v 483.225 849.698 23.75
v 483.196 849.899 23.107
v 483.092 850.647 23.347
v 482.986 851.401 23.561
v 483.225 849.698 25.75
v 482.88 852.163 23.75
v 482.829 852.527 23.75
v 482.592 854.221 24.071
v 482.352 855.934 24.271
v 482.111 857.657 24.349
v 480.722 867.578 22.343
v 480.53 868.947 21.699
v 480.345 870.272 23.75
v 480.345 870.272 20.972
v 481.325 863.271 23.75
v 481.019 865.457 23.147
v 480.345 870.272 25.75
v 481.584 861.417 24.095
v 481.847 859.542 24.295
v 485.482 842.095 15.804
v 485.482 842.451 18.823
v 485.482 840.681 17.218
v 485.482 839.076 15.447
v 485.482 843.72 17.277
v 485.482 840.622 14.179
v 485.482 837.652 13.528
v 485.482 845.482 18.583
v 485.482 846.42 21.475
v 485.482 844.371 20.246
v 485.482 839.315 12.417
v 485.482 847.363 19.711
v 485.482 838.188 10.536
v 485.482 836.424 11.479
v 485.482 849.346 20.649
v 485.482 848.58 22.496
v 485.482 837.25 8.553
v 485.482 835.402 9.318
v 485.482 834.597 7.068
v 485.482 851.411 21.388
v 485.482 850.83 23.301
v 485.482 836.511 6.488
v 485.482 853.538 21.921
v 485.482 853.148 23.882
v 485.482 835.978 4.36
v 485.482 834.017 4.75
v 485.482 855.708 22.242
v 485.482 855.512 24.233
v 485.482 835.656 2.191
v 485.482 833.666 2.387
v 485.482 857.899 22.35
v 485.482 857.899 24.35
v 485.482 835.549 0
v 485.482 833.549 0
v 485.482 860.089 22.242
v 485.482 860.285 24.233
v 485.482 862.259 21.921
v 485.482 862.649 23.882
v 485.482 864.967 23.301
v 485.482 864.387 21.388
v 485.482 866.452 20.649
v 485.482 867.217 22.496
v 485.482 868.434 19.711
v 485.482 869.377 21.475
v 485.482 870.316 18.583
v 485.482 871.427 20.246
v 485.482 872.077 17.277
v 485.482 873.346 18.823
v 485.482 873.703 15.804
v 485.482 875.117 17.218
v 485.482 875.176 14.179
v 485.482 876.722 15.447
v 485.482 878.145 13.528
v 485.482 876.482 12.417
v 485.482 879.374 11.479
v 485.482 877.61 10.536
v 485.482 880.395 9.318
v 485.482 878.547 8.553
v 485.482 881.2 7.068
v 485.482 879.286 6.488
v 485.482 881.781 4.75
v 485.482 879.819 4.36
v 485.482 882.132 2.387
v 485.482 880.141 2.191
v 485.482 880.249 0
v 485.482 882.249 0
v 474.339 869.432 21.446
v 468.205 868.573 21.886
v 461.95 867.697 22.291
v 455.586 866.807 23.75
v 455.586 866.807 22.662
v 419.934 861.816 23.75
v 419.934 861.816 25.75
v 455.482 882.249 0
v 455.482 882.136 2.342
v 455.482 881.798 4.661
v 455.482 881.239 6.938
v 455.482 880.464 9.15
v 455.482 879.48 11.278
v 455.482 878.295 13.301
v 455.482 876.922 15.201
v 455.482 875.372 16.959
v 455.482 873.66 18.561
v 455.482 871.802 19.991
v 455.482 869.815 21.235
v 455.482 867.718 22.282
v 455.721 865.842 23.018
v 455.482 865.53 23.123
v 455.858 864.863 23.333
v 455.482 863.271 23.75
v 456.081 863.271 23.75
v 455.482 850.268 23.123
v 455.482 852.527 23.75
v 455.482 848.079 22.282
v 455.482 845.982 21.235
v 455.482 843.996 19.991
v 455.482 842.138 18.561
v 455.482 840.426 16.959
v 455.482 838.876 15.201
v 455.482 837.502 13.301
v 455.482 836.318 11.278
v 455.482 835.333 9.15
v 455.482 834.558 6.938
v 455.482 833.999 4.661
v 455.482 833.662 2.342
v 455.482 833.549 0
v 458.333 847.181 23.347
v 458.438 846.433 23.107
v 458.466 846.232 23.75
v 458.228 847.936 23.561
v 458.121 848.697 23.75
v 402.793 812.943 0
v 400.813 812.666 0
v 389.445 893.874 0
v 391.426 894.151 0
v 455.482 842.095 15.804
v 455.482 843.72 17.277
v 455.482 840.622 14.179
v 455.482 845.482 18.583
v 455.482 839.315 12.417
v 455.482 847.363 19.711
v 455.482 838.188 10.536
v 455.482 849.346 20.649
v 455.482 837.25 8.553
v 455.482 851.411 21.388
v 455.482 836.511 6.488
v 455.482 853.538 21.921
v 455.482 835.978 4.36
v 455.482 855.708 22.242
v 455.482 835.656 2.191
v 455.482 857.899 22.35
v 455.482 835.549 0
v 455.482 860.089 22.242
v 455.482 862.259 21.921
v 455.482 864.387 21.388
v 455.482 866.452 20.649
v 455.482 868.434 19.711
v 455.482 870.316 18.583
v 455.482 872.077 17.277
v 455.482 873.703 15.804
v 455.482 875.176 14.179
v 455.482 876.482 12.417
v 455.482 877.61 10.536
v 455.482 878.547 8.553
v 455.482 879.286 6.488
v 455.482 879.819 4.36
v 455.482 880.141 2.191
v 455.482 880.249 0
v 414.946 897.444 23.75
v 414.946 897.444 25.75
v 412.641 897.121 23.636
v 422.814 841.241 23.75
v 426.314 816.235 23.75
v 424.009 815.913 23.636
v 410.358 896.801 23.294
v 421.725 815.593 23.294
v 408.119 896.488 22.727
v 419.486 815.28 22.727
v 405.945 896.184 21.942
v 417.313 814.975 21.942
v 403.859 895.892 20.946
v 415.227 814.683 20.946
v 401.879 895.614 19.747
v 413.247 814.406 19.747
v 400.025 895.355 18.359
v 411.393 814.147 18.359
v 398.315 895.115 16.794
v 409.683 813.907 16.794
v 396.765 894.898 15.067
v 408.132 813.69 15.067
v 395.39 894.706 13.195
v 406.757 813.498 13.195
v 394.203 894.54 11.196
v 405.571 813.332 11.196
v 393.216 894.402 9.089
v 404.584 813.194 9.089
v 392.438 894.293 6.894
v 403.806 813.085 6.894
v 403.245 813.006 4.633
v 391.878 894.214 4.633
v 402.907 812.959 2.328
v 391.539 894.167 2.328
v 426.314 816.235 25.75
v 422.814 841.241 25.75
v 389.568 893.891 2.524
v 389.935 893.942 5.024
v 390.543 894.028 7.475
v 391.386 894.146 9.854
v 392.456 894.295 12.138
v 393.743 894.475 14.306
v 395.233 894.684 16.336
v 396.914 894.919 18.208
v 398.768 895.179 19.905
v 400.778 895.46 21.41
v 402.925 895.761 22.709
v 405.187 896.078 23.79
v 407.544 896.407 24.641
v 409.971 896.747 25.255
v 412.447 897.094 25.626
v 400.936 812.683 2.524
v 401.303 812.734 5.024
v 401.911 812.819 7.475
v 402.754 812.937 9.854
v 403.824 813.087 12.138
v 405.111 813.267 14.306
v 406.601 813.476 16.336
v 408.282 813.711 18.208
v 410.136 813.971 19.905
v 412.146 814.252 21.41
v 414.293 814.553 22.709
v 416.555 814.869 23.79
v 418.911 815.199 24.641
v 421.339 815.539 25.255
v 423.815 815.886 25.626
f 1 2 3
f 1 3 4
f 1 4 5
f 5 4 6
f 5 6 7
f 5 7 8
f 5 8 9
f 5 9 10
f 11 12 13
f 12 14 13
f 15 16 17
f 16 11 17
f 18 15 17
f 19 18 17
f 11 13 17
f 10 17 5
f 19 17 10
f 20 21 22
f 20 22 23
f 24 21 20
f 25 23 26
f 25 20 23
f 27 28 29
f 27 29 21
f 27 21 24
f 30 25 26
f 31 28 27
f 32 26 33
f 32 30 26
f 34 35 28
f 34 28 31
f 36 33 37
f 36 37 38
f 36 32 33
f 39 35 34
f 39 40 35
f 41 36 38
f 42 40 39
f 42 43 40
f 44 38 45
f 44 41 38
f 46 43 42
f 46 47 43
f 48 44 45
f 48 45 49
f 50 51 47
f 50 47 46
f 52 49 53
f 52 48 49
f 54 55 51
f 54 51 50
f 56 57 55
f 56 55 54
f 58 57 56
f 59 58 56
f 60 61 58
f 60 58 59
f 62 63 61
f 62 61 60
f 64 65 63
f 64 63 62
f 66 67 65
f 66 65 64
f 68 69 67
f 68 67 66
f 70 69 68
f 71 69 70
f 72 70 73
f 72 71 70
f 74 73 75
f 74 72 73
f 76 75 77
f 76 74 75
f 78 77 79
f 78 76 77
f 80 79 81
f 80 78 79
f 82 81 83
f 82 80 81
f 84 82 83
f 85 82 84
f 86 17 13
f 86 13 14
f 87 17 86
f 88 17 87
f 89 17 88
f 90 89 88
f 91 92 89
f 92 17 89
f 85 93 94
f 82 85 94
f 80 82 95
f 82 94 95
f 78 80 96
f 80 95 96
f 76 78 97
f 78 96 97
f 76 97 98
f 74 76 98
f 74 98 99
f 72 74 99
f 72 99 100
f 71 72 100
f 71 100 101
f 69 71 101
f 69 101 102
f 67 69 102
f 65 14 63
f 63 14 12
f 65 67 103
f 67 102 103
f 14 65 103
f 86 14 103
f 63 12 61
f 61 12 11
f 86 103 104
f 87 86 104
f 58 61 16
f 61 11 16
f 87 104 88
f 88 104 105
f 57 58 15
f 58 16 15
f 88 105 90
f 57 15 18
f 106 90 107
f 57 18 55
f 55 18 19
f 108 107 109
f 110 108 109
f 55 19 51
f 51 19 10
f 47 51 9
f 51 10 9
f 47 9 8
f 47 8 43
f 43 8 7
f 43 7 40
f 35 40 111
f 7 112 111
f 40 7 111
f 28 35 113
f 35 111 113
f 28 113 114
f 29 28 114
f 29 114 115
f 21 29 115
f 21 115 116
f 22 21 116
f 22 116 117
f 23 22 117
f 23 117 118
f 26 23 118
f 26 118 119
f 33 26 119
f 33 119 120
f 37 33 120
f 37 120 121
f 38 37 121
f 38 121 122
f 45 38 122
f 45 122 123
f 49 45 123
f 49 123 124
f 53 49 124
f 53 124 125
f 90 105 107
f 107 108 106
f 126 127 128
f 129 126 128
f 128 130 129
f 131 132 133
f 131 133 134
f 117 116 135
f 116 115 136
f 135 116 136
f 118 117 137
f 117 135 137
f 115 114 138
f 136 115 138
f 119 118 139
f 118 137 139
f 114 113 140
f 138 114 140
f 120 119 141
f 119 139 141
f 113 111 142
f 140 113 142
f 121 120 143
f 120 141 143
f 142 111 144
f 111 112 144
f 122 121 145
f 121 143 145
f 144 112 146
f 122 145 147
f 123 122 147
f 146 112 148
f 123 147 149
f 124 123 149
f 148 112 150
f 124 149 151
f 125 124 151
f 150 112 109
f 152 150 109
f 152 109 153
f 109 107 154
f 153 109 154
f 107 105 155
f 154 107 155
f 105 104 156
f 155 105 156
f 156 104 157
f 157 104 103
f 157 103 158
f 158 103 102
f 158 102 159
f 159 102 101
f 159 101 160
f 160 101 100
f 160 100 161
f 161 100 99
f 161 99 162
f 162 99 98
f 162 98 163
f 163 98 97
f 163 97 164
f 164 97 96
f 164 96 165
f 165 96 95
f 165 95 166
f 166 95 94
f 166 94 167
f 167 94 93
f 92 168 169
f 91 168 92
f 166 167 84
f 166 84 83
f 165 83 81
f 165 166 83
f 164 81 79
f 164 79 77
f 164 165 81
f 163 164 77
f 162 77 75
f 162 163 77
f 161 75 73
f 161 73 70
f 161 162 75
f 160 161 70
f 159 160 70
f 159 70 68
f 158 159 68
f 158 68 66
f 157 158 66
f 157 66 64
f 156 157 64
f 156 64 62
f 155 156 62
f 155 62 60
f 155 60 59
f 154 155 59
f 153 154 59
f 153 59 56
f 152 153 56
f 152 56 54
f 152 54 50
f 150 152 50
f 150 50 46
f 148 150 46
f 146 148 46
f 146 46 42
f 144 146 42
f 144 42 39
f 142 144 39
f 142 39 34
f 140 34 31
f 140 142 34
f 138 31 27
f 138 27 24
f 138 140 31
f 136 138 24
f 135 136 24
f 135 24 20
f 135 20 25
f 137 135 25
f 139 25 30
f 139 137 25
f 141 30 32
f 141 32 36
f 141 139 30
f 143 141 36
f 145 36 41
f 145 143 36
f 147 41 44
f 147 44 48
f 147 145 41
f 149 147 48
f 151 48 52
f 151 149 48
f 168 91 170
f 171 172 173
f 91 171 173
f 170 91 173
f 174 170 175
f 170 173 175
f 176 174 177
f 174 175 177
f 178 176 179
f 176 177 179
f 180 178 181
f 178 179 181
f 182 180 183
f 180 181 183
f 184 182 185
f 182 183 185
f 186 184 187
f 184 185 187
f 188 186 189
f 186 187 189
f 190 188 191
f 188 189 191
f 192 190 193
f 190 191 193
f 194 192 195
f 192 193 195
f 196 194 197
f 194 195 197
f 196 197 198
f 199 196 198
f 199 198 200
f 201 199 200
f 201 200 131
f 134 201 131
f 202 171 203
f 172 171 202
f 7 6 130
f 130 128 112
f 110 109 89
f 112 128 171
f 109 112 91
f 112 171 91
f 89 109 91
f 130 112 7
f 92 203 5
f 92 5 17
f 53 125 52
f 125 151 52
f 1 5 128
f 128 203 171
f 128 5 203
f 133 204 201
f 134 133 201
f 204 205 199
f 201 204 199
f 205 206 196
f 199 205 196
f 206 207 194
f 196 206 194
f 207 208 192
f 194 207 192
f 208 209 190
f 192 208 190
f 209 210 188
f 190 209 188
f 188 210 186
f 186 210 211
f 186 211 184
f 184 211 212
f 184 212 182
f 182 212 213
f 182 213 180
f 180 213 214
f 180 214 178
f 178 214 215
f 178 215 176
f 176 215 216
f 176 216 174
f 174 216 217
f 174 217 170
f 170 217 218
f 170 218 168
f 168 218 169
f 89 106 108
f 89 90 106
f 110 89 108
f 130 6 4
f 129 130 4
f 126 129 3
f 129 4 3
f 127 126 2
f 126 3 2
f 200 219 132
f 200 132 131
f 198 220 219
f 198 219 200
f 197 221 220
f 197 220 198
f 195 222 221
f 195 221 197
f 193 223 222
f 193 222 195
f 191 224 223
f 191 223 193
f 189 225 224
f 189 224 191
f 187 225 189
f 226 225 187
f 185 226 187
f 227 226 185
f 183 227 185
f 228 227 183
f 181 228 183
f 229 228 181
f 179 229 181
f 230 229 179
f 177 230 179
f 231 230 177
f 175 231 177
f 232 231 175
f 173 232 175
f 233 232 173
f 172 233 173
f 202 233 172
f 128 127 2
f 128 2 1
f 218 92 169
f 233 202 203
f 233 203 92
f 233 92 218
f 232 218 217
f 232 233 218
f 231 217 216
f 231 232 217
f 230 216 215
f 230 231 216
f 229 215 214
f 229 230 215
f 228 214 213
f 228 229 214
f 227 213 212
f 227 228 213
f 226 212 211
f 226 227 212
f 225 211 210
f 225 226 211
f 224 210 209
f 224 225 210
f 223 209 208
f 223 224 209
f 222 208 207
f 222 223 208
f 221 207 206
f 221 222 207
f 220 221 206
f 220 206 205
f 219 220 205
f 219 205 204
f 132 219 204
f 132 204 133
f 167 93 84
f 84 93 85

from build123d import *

# Parameters (mm, degrees)
SKETCH3_R               = 25.75
SKETCH3_R_2             = 23.75
BOSS_EXTRUDE1_DEPTH     = 82
SKETCH2_R               = 24.35
SKETCH2_R_2             = 22.35
BOSS_EXTRUDE2_DEPTH     = 30
CUT_EXTRUDE1_DEPTH      = 30
CUT_EXTRUDE1_DEPTH_BACK = 30
SKETCH5_W               = 101.816386604
SKETCH5_H               = 90.816460778
CUT_EXTRUDE2_DEPTH      = 30
SKETCH6_W               = 2
SKETCH6_H               = 20.775230247
BOSS_EXTRUDE3_DEPTH     = 61
BOSS_EXTRUDE5_DEPTH     = 25


with BuildPart() as part:
    # Sketch3 → Boss-Extrude1 (new body)
    with BuildSketch(Plane(origin=(-103.870896529, 742.017814767, 0), x_dir=(-0.9903438719336157, -0.13863266326351154, 0), z_dir=(0.13863266326351156, -0.9903438719336158, 0))):
        with Locations((-535.354479902, 0)):
            Circle(SKETCH3_R)
        with Locations((-535.354479902, 0)):
            Circle(SKETCH3_R_2, mode=Mode.SUBTRACT)
    extrude(amount=-BOSS_EXTRUDE1_DEPTH)

    # Sketch4 → Cut-Extrude1 (cut, two sides: drawn at the far end of the back side and taken through both)
    with BuildSketch(Plane.XY.offset(-CUT_EXTRUDE1_DEPTH_BACK)):
        Polygon((414.924769966, 897.597101018), (426.314131953, 816.235432106), (451.815486656, 819.805223185), (440.426124669, 901.166892097), align=None)
    extrude(amount=CUT_EXTRUDE1_DEPTH + CUT_EXTRUDE1_DEPTH_BACK, mode=Mode.SUBTRACT)


with BuildPart() as body_2:
    # Sketch2 → Boss-Extrude2 (new body)
    with BuildSketch(Plane(origin=(455.481917253, 0, 0), x_dir=(0, 0, -1), z_dir=(1, 0, 0))):
        with Locations((0, 857.898759871)):
            Circle(SKETCH2_R)
        with Locations((0, 857.898759871)):
            Circle(SKETCH2_R_2, mode=Mode.SUBTRACT)
    extrude(amount=BOSS_EXTRUDE2_DEPTH)


with BuildPart() as cut_extrude2_tool:
    # Sketch5 → Cut-Extrude2 (new body)
    with BuildSketch(Plane.XY):
        with Locations((437.415428166, 854.729783017)):
            Rectangle(SKETCH5_W, SKETCH5_H)
    extrude(amount=-CUT_EXTRUDE2_DEPTH)


with BuildPart() as part_1:
    add(part.part)

    # Cut-Extrude2: cut by cut_extrude2_tool
    add(cut_extrude2_tool.part, mode=Mode.SUBTRACT)



with BuildPart() as body_2_1:
    add(body_2.part)

    # Cut-Extrude2: cut by cut_extrude2_tool
    add(cut_extrude2_tool.part, mode=Mode.SUBTRACT)


with BuildPart() as part_2:
    add(part_1.part)

    add(body_2_1.part)  # Boss-Extrude3 merges body 2
    # Sketch6 → Boss-Extrude3 (add)
    with BuildSketch(Plane(origin=(530.185028483, 74.217617339, 0), x_dir=(0, 0, -1), z_dir=(0.9903438719336157, 0.13863266326351165, 0))):
        with Locations((-24.75, 784.889811472)):
            Rectangle(SKETCH6_W, SKETCH6_H)
    extrude(amount=BOSS_EXTRUDE3_DEPTH)

    # Sketch7 → Boss-Extrude5 (add)
    with BuildSketch(Plane(origin=(590.596004671, 82.674209798, 0), x_dir=(0, 0, -1), z_dir=(0.9903438719336163, 0.1386326632635082, 0))):
        with BuildLine():
            Line((-23.107264421, 774.705646561), (-23.75, 774.502196348))
            Line((-23.75, 774.502196348), (-25.75, 774.502196348))
            Line((-25.75, 774.502196348), (-25.75, 795.277426595))
            Line((-25.75, 795.277426595), (-20.530540655, 795.277426595))
            ThreePointArc((-20.530540655, 795.277426595), (-24.164463247, 785.285330407), (-23.107264421, 774.705646561))
        make_face()
    extrude(amount=-BOSS_EXTRUDE5_DEPTH)


solid = part_2.part
